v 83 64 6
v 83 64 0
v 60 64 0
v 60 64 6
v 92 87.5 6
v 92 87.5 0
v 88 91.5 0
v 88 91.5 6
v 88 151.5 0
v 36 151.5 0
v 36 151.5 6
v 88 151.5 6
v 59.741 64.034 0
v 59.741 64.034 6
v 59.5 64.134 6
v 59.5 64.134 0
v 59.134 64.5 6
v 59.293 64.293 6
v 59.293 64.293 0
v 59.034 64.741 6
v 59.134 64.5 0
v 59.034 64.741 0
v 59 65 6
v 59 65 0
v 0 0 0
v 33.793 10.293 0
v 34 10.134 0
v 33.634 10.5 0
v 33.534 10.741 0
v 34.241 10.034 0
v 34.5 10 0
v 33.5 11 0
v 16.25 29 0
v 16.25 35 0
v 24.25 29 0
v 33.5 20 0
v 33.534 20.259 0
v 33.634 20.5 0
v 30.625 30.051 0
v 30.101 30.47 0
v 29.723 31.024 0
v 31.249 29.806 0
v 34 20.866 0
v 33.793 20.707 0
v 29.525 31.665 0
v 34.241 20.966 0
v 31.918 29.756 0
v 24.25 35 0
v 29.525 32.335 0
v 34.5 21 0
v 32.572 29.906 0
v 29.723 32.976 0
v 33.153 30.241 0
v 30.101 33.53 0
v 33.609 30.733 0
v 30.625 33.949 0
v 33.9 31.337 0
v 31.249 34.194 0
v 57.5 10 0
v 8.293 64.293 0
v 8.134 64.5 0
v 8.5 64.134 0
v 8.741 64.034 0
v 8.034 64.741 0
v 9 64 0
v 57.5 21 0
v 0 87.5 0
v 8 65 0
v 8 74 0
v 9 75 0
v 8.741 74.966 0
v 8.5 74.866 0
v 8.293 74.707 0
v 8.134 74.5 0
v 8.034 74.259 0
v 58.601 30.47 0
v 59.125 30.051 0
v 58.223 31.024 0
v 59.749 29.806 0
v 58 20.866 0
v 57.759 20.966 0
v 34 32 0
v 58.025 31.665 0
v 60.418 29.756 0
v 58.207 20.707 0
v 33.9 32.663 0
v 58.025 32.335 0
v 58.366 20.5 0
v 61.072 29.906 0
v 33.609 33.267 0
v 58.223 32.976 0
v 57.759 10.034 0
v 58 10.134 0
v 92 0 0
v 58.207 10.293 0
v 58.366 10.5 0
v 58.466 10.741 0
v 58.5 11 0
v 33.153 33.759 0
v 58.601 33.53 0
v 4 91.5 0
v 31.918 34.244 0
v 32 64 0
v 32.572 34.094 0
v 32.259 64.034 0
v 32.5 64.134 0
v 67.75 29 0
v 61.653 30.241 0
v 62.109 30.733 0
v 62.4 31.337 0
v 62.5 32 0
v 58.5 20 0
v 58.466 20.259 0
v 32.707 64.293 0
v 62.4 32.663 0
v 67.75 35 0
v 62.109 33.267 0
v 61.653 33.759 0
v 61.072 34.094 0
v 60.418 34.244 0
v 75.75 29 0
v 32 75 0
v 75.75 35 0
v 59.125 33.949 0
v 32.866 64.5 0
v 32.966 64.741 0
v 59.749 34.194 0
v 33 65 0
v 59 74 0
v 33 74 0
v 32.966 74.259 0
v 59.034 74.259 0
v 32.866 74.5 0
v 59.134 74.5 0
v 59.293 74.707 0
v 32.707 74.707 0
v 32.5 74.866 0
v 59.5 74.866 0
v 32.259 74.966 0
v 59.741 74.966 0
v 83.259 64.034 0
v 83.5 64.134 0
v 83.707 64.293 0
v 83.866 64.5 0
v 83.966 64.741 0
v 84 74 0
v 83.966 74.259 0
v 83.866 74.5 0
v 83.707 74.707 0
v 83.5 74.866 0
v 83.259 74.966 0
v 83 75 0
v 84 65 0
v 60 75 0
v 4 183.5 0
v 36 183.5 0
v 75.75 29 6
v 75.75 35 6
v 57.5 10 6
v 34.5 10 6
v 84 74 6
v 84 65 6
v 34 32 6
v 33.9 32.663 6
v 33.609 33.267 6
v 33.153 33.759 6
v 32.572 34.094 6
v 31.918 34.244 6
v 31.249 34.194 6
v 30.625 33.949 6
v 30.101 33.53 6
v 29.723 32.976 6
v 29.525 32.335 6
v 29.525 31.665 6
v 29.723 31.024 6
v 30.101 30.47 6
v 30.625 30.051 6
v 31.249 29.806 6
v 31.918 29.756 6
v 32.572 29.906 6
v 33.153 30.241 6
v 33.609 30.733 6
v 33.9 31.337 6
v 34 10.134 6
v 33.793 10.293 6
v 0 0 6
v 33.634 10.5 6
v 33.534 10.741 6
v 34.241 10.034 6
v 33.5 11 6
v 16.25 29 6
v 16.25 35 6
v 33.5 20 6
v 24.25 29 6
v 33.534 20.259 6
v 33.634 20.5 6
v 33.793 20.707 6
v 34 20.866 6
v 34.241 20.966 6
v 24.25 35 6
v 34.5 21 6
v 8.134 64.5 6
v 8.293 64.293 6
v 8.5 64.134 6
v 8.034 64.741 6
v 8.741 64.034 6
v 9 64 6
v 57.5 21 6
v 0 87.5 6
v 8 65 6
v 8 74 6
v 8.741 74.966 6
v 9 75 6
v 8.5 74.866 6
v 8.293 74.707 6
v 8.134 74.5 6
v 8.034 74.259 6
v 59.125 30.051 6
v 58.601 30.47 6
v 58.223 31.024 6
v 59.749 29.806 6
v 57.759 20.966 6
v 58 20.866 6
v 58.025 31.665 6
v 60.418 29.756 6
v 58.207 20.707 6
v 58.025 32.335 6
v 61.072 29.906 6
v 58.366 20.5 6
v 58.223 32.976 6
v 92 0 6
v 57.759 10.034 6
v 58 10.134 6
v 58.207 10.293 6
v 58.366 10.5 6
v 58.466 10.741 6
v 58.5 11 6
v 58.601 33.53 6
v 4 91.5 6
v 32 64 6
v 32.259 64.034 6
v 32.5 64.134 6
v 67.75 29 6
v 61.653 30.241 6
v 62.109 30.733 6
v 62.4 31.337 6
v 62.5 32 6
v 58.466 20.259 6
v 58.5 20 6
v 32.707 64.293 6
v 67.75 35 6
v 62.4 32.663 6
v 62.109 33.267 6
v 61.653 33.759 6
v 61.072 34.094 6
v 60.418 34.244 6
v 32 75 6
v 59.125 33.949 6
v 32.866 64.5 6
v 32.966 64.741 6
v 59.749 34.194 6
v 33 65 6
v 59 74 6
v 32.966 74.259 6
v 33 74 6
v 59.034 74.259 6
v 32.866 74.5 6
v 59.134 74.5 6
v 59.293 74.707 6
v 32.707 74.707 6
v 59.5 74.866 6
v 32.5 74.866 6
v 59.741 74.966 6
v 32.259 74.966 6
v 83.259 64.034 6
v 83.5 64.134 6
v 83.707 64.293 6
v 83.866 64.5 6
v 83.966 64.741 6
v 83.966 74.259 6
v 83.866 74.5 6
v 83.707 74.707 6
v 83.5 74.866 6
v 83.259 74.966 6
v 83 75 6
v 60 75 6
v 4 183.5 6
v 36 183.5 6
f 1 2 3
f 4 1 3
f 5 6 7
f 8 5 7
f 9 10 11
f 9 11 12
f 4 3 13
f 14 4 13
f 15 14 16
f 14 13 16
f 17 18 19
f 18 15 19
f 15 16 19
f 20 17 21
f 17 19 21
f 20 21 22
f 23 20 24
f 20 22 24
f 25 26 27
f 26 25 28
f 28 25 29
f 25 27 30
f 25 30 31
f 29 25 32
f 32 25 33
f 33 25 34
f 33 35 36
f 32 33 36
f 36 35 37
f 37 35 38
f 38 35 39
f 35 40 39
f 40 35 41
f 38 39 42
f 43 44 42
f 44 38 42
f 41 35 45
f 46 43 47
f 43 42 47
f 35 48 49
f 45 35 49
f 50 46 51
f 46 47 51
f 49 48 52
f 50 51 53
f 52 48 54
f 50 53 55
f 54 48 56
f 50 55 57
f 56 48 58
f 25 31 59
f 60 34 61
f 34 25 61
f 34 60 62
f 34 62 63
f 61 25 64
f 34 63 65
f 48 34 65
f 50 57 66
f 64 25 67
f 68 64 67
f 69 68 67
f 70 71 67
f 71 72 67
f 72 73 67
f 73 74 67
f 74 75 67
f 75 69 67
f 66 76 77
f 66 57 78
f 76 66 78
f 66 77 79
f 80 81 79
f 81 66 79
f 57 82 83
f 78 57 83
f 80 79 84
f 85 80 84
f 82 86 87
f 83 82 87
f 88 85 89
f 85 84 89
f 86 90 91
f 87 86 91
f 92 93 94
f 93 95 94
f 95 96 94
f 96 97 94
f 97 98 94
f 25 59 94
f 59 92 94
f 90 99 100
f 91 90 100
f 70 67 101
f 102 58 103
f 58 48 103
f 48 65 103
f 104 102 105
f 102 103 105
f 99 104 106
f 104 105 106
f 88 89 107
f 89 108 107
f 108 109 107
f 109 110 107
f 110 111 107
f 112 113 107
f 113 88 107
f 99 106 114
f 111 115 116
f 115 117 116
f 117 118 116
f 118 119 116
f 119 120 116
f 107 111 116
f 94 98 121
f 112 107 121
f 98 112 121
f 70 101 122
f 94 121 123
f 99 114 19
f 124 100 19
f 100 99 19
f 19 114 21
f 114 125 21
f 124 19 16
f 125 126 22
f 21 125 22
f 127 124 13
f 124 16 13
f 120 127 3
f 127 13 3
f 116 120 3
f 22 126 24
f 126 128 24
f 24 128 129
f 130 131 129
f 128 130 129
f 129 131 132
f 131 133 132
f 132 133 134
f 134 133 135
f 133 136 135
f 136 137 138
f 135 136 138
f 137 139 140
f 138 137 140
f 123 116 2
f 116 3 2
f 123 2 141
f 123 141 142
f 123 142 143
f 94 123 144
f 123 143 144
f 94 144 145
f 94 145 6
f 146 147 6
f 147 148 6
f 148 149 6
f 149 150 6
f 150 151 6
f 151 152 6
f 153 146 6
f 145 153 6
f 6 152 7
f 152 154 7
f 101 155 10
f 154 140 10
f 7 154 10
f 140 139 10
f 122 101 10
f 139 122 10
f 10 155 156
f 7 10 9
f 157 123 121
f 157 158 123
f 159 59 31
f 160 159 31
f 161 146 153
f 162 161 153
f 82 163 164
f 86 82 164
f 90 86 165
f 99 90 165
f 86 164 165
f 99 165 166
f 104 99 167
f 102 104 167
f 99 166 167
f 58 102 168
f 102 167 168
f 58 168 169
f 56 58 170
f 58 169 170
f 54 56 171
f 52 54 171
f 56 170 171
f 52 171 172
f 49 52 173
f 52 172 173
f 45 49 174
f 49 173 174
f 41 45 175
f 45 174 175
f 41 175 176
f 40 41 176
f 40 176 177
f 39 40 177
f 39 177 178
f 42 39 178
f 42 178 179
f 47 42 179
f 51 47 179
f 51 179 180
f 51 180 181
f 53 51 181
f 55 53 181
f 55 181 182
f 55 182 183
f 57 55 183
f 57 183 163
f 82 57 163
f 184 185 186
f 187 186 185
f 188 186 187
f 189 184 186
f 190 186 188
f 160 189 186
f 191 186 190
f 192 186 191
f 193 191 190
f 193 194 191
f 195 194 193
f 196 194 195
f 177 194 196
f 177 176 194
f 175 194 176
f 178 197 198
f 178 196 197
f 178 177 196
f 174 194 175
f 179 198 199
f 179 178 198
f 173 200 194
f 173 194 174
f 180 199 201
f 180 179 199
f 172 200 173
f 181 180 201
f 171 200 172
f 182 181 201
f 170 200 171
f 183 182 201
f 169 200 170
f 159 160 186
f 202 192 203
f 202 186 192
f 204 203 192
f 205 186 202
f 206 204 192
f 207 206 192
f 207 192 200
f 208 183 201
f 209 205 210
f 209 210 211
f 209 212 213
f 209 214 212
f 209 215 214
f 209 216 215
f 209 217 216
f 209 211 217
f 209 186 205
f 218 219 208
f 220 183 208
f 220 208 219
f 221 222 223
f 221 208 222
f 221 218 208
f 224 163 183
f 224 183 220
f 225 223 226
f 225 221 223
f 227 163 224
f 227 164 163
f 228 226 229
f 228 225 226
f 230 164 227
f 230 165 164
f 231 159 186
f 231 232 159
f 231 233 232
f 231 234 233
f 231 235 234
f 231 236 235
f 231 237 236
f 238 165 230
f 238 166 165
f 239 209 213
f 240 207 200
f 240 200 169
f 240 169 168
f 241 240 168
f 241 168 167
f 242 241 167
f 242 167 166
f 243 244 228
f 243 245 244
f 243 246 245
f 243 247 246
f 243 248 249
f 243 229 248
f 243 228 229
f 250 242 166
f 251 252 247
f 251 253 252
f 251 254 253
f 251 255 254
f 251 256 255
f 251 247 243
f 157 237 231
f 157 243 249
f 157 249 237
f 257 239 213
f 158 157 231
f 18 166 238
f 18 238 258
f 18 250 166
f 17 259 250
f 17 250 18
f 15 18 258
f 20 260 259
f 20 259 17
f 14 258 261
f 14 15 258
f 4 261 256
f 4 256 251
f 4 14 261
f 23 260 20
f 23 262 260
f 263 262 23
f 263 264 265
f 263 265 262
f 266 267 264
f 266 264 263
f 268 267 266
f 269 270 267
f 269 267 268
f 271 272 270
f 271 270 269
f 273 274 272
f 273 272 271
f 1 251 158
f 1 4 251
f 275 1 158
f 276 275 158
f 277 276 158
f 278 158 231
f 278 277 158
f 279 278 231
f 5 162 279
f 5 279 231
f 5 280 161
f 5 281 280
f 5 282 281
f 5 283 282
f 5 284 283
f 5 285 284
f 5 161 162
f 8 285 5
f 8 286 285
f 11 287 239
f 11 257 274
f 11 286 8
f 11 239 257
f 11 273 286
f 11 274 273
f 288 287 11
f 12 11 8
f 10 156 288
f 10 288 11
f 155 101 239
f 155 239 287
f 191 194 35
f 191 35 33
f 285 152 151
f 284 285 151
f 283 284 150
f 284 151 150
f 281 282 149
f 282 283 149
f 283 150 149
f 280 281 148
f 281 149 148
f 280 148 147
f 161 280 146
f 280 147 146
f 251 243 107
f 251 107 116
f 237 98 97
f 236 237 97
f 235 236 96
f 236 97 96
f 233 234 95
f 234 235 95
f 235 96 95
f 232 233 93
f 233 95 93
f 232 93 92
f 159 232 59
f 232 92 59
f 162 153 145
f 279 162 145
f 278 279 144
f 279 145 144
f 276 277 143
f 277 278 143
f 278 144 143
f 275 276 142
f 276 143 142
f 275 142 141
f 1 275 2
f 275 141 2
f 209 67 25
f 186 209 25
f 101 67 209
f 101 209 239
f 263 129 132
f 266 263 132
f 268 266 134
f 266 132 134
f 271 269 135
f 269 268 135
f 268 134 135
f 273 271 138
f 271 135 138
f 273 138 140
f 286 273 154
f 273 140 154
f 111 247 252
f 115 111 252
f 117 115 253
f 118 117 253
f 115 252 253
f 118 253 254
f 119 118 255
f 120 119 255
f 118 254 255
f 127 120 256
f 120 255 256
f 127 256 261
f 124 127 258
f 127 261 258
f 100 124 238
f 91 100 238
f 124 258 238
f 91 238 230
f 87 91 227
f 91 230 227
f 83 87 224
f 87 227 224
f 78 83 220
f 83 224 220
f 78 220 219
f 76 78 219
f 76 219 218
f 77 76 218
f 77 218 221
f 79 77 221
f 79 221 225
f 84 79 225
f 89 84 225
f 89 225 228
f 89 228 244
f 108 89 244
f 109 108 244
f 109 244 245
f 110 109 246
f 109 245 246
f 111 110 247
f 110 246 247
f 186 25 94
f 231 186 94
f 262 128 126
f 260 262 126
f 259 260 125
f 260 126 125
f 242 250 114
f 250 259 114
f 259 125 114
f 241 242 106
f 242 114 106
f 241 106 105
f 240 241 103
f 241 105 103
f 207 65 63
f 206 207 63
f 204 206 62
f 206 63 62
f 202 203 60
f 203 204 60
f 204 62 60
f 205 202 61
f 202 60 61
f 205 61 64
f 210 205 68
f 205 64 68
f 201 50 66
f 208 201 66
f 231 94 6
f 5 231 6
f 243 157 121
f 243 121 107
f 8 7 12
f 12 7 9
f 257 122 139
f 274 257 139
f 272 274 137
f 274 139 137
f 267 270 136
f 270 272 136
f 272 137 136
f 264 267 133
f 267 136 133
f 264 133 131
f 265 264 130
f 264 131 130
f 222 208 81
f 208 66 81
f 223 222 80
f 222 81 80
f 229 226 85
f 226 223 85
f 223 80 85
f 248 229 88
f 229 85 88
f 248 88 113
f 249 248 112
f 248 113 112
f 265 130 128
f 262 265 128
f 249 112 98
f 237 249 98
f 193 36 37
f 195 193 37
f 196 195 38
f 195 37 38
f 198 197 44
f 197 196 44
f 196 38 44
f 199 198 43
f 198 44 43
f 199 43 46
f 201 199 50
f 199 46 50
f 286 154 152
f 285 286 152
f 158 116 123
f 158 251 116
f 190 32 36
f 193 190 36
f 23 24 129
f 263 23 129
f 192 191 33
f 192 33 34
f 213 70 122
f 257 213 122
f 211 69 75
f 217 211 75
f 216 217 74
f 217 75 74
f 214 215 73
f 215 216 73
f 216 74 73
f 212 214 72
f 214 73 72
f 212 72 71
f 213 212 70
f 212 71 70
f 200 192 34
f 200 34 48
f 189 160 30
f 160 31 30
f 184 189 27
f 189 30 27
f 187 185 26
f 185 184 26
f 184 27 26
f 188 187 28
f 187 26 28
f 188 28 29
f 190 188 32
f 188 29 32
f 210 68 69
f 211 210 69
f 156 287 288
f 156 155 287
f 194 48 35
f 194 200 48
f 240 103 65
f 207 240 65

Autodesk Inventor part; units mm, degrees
ref_plane "YZ Plane" through (0, 0, 0) normal (1, 0, 0) x (0, 1, 0)
ref_plane "XZ Plane" through (0, 0, 0) normal (0, 1, 0) x (-1, 0, 0)
ref_plane "XY Plane" through (0, 0, 0) normal (0, 0, 1) x (1, 0, 0)
sketch "Sketch1" plane through (0, 0, 0) normal (0, 0, 1) x (1, 0, 0)
  line L0 (0, 0) -> (92, 0)
  line L1 (92, 0) -> (92, 87.5)
  line L2 (0, 87.5) -> (0, 0)
  line L3 (0, 87.5) -> (4, 91.5)
  line L4 (92, 87.5) -> (88, 91.5)
  line L5 (4, 91.5) -> (4, 183.5)
  line L6 (88, 91.5) -> (88, 151.5)
  line L7 (34.5, 21) -> (57.5, 21)
  line L8 (58.5, 20) -> (58.5, 11)
  line L9 (57.5, 10) -> (34.5, 10)
  line L10 (33.5, 11) -> (33.5, 20)
  arc A0 (34.5, 21) -> (33.5, 20) centre (34.5, 20) ccw
  arc A1 (33.5, 11) -> (34.5, 10) centre (34.5, 11) ccw
  arc A2 (57.5, 10) -> (58.5, 11) centre (57.5, 11) ccw
  arc A3 (58.5, 20) -> (57.5, 21) centre (57.5, 20) ccw
  line L11 (9, 75) -> (32, 75)
  line L12 (33, 74) -> (33, 65)
  line L13 (32, 64) -> (9, 64)
  line L14 (8, 65) -> (8, 74)
  arc A4 (9, 75) -> (8, 74) centre (9, 74) ccw
  arc A5 (8, 65) -> (9, 64) centre (9, 65) ccw
  arc A6 (32, 64) -> (33, 65) centre (32, 65) ccw
  arc A7 (33, 74) -> (32, 75) centre (32, 74) ccw
  arc A8 (59, 65) -> (60, 64) centre (60, 65) ccw
  arc A9 (60, 75) -> (59, 74) centre (60, 74) ccw
  line L15 (83, 64) -> (60, 64)
  line L16 (84, 74) -> (84, 65)
  arc A10 (83, 64) -> (84, 65) centre (83, 65) ccw
  arc A11 (84, 74) -> (83, 75) centre (83, 74) ccw
  line L17 (60, 75) -> (83, 75)
  line L18 (59, 65) -> (59, 74)
  line L19 (4, 183.5) -> (36, 183.5)
  line L20 (36, 183.5) -> (36, 151.5)
  line L21 (36, 151.5) -> (88, 151.5)
  point P0 (46, 10)
  point P1 (46, 0)
  point P2 (84, 69.5)
  point P3 (58.5, 15.5)
  dimension "d0" = 92
  dimension "d1" = 135
  dimension "d2" = 1
  dimension "d3" = 11
  dimension "d4" = 25
  dimension "d5" = 1
  dimension "d6" = 11
  dimension "d7" = 25
  dimension "d8" = 1
  dimension "d9" = 11
  dimension "d10" = 25
  dimension "d11" = 4
  dimension "d12" = 54
  dimension "d13" = 8
  dimension "d14" = 8
  dimension "d15" = 10
  dimension "d16" = 32
  dimension "d17" = 32
  dimension "d18" = 183.5
  dimension "d19" = 87.5
extrude "Extrusion1" add sketch "Sketch1" along normal blind 6
sketch "Sketch2" plane through (0, 0, 6) normal (0, 0, 1) x (1, 0, 0)
  line L0 (34.5, 21) -> (57.5, 21) projected
  line L1 (33.5, 11) -> (33.5, 20) projected
  line L2 (34, 23) -> (58, 23) construction
  line L3 (58, 23) -> (58, 8) construction
  line L4 (58, 8) -> (34, 8) construction
  line L5 (34, 8) -> (34, 23) construction
  circle A0 centre (31.75, 32) radius 2.25
  circle A1 centre (60.25, 32) radius 2.25
  line L6 (31.75, 32) -> (60.25, 32) construction
  point P0 (34, 15.5)
  point P1 (33.5, 15.5)
  point P2 (46, 23)
  point P3 (46, 21)
  point P4 (46, 32)
  dimension "d22" = 24
  dimension "d23" = 15
  dimension "d24" = 4.5
  dimension "d25" = 28.5
  dimension "d26" = 9
extrude "Extrusion2" cut sketch "Sketch2" against normal blind 6
sketch "Sketch3" plane through (0, 0, 6) normal (0, 0, 1) x (1, 0, 0)
  circle A0 centre (31.75, 32) radius 2.25 projected
  circle A1 centre (60.25, 32) radius 2.25 projected
  line L0 (16.25, 35) -> (24.25, 35)
  line L1 (24.25, 35) -> (24.25, 29)
  line L2 (24.25, 29) -> (16.25, 29)
  line L3 (16.25, 29) -> (16.25, 35)
  line L4 (67.75, 35) -> (75.75, 35)
  line L5 (75.75, 35) -> (75.75, 29)
  line L6 (75.75, 29) -> (67.75, 29)
  line L7 (67.75, 29) -> (67.75, 35)
  point P0 (24.25, 32)
  dimension "d29" = 6
  dimension "d30" = 8
  dimension "d31" = 8
  dimension "d32" = 7.5
  dimension "d33" = 7.5
extrude "Extrusion3" cut sketch "Sketch3" against normal blind 6 contours L0 L1 L2 L3 | L4 L5 L6 L7
equation "\"d14\" = d13"
properties part number "x_carriage_front"
